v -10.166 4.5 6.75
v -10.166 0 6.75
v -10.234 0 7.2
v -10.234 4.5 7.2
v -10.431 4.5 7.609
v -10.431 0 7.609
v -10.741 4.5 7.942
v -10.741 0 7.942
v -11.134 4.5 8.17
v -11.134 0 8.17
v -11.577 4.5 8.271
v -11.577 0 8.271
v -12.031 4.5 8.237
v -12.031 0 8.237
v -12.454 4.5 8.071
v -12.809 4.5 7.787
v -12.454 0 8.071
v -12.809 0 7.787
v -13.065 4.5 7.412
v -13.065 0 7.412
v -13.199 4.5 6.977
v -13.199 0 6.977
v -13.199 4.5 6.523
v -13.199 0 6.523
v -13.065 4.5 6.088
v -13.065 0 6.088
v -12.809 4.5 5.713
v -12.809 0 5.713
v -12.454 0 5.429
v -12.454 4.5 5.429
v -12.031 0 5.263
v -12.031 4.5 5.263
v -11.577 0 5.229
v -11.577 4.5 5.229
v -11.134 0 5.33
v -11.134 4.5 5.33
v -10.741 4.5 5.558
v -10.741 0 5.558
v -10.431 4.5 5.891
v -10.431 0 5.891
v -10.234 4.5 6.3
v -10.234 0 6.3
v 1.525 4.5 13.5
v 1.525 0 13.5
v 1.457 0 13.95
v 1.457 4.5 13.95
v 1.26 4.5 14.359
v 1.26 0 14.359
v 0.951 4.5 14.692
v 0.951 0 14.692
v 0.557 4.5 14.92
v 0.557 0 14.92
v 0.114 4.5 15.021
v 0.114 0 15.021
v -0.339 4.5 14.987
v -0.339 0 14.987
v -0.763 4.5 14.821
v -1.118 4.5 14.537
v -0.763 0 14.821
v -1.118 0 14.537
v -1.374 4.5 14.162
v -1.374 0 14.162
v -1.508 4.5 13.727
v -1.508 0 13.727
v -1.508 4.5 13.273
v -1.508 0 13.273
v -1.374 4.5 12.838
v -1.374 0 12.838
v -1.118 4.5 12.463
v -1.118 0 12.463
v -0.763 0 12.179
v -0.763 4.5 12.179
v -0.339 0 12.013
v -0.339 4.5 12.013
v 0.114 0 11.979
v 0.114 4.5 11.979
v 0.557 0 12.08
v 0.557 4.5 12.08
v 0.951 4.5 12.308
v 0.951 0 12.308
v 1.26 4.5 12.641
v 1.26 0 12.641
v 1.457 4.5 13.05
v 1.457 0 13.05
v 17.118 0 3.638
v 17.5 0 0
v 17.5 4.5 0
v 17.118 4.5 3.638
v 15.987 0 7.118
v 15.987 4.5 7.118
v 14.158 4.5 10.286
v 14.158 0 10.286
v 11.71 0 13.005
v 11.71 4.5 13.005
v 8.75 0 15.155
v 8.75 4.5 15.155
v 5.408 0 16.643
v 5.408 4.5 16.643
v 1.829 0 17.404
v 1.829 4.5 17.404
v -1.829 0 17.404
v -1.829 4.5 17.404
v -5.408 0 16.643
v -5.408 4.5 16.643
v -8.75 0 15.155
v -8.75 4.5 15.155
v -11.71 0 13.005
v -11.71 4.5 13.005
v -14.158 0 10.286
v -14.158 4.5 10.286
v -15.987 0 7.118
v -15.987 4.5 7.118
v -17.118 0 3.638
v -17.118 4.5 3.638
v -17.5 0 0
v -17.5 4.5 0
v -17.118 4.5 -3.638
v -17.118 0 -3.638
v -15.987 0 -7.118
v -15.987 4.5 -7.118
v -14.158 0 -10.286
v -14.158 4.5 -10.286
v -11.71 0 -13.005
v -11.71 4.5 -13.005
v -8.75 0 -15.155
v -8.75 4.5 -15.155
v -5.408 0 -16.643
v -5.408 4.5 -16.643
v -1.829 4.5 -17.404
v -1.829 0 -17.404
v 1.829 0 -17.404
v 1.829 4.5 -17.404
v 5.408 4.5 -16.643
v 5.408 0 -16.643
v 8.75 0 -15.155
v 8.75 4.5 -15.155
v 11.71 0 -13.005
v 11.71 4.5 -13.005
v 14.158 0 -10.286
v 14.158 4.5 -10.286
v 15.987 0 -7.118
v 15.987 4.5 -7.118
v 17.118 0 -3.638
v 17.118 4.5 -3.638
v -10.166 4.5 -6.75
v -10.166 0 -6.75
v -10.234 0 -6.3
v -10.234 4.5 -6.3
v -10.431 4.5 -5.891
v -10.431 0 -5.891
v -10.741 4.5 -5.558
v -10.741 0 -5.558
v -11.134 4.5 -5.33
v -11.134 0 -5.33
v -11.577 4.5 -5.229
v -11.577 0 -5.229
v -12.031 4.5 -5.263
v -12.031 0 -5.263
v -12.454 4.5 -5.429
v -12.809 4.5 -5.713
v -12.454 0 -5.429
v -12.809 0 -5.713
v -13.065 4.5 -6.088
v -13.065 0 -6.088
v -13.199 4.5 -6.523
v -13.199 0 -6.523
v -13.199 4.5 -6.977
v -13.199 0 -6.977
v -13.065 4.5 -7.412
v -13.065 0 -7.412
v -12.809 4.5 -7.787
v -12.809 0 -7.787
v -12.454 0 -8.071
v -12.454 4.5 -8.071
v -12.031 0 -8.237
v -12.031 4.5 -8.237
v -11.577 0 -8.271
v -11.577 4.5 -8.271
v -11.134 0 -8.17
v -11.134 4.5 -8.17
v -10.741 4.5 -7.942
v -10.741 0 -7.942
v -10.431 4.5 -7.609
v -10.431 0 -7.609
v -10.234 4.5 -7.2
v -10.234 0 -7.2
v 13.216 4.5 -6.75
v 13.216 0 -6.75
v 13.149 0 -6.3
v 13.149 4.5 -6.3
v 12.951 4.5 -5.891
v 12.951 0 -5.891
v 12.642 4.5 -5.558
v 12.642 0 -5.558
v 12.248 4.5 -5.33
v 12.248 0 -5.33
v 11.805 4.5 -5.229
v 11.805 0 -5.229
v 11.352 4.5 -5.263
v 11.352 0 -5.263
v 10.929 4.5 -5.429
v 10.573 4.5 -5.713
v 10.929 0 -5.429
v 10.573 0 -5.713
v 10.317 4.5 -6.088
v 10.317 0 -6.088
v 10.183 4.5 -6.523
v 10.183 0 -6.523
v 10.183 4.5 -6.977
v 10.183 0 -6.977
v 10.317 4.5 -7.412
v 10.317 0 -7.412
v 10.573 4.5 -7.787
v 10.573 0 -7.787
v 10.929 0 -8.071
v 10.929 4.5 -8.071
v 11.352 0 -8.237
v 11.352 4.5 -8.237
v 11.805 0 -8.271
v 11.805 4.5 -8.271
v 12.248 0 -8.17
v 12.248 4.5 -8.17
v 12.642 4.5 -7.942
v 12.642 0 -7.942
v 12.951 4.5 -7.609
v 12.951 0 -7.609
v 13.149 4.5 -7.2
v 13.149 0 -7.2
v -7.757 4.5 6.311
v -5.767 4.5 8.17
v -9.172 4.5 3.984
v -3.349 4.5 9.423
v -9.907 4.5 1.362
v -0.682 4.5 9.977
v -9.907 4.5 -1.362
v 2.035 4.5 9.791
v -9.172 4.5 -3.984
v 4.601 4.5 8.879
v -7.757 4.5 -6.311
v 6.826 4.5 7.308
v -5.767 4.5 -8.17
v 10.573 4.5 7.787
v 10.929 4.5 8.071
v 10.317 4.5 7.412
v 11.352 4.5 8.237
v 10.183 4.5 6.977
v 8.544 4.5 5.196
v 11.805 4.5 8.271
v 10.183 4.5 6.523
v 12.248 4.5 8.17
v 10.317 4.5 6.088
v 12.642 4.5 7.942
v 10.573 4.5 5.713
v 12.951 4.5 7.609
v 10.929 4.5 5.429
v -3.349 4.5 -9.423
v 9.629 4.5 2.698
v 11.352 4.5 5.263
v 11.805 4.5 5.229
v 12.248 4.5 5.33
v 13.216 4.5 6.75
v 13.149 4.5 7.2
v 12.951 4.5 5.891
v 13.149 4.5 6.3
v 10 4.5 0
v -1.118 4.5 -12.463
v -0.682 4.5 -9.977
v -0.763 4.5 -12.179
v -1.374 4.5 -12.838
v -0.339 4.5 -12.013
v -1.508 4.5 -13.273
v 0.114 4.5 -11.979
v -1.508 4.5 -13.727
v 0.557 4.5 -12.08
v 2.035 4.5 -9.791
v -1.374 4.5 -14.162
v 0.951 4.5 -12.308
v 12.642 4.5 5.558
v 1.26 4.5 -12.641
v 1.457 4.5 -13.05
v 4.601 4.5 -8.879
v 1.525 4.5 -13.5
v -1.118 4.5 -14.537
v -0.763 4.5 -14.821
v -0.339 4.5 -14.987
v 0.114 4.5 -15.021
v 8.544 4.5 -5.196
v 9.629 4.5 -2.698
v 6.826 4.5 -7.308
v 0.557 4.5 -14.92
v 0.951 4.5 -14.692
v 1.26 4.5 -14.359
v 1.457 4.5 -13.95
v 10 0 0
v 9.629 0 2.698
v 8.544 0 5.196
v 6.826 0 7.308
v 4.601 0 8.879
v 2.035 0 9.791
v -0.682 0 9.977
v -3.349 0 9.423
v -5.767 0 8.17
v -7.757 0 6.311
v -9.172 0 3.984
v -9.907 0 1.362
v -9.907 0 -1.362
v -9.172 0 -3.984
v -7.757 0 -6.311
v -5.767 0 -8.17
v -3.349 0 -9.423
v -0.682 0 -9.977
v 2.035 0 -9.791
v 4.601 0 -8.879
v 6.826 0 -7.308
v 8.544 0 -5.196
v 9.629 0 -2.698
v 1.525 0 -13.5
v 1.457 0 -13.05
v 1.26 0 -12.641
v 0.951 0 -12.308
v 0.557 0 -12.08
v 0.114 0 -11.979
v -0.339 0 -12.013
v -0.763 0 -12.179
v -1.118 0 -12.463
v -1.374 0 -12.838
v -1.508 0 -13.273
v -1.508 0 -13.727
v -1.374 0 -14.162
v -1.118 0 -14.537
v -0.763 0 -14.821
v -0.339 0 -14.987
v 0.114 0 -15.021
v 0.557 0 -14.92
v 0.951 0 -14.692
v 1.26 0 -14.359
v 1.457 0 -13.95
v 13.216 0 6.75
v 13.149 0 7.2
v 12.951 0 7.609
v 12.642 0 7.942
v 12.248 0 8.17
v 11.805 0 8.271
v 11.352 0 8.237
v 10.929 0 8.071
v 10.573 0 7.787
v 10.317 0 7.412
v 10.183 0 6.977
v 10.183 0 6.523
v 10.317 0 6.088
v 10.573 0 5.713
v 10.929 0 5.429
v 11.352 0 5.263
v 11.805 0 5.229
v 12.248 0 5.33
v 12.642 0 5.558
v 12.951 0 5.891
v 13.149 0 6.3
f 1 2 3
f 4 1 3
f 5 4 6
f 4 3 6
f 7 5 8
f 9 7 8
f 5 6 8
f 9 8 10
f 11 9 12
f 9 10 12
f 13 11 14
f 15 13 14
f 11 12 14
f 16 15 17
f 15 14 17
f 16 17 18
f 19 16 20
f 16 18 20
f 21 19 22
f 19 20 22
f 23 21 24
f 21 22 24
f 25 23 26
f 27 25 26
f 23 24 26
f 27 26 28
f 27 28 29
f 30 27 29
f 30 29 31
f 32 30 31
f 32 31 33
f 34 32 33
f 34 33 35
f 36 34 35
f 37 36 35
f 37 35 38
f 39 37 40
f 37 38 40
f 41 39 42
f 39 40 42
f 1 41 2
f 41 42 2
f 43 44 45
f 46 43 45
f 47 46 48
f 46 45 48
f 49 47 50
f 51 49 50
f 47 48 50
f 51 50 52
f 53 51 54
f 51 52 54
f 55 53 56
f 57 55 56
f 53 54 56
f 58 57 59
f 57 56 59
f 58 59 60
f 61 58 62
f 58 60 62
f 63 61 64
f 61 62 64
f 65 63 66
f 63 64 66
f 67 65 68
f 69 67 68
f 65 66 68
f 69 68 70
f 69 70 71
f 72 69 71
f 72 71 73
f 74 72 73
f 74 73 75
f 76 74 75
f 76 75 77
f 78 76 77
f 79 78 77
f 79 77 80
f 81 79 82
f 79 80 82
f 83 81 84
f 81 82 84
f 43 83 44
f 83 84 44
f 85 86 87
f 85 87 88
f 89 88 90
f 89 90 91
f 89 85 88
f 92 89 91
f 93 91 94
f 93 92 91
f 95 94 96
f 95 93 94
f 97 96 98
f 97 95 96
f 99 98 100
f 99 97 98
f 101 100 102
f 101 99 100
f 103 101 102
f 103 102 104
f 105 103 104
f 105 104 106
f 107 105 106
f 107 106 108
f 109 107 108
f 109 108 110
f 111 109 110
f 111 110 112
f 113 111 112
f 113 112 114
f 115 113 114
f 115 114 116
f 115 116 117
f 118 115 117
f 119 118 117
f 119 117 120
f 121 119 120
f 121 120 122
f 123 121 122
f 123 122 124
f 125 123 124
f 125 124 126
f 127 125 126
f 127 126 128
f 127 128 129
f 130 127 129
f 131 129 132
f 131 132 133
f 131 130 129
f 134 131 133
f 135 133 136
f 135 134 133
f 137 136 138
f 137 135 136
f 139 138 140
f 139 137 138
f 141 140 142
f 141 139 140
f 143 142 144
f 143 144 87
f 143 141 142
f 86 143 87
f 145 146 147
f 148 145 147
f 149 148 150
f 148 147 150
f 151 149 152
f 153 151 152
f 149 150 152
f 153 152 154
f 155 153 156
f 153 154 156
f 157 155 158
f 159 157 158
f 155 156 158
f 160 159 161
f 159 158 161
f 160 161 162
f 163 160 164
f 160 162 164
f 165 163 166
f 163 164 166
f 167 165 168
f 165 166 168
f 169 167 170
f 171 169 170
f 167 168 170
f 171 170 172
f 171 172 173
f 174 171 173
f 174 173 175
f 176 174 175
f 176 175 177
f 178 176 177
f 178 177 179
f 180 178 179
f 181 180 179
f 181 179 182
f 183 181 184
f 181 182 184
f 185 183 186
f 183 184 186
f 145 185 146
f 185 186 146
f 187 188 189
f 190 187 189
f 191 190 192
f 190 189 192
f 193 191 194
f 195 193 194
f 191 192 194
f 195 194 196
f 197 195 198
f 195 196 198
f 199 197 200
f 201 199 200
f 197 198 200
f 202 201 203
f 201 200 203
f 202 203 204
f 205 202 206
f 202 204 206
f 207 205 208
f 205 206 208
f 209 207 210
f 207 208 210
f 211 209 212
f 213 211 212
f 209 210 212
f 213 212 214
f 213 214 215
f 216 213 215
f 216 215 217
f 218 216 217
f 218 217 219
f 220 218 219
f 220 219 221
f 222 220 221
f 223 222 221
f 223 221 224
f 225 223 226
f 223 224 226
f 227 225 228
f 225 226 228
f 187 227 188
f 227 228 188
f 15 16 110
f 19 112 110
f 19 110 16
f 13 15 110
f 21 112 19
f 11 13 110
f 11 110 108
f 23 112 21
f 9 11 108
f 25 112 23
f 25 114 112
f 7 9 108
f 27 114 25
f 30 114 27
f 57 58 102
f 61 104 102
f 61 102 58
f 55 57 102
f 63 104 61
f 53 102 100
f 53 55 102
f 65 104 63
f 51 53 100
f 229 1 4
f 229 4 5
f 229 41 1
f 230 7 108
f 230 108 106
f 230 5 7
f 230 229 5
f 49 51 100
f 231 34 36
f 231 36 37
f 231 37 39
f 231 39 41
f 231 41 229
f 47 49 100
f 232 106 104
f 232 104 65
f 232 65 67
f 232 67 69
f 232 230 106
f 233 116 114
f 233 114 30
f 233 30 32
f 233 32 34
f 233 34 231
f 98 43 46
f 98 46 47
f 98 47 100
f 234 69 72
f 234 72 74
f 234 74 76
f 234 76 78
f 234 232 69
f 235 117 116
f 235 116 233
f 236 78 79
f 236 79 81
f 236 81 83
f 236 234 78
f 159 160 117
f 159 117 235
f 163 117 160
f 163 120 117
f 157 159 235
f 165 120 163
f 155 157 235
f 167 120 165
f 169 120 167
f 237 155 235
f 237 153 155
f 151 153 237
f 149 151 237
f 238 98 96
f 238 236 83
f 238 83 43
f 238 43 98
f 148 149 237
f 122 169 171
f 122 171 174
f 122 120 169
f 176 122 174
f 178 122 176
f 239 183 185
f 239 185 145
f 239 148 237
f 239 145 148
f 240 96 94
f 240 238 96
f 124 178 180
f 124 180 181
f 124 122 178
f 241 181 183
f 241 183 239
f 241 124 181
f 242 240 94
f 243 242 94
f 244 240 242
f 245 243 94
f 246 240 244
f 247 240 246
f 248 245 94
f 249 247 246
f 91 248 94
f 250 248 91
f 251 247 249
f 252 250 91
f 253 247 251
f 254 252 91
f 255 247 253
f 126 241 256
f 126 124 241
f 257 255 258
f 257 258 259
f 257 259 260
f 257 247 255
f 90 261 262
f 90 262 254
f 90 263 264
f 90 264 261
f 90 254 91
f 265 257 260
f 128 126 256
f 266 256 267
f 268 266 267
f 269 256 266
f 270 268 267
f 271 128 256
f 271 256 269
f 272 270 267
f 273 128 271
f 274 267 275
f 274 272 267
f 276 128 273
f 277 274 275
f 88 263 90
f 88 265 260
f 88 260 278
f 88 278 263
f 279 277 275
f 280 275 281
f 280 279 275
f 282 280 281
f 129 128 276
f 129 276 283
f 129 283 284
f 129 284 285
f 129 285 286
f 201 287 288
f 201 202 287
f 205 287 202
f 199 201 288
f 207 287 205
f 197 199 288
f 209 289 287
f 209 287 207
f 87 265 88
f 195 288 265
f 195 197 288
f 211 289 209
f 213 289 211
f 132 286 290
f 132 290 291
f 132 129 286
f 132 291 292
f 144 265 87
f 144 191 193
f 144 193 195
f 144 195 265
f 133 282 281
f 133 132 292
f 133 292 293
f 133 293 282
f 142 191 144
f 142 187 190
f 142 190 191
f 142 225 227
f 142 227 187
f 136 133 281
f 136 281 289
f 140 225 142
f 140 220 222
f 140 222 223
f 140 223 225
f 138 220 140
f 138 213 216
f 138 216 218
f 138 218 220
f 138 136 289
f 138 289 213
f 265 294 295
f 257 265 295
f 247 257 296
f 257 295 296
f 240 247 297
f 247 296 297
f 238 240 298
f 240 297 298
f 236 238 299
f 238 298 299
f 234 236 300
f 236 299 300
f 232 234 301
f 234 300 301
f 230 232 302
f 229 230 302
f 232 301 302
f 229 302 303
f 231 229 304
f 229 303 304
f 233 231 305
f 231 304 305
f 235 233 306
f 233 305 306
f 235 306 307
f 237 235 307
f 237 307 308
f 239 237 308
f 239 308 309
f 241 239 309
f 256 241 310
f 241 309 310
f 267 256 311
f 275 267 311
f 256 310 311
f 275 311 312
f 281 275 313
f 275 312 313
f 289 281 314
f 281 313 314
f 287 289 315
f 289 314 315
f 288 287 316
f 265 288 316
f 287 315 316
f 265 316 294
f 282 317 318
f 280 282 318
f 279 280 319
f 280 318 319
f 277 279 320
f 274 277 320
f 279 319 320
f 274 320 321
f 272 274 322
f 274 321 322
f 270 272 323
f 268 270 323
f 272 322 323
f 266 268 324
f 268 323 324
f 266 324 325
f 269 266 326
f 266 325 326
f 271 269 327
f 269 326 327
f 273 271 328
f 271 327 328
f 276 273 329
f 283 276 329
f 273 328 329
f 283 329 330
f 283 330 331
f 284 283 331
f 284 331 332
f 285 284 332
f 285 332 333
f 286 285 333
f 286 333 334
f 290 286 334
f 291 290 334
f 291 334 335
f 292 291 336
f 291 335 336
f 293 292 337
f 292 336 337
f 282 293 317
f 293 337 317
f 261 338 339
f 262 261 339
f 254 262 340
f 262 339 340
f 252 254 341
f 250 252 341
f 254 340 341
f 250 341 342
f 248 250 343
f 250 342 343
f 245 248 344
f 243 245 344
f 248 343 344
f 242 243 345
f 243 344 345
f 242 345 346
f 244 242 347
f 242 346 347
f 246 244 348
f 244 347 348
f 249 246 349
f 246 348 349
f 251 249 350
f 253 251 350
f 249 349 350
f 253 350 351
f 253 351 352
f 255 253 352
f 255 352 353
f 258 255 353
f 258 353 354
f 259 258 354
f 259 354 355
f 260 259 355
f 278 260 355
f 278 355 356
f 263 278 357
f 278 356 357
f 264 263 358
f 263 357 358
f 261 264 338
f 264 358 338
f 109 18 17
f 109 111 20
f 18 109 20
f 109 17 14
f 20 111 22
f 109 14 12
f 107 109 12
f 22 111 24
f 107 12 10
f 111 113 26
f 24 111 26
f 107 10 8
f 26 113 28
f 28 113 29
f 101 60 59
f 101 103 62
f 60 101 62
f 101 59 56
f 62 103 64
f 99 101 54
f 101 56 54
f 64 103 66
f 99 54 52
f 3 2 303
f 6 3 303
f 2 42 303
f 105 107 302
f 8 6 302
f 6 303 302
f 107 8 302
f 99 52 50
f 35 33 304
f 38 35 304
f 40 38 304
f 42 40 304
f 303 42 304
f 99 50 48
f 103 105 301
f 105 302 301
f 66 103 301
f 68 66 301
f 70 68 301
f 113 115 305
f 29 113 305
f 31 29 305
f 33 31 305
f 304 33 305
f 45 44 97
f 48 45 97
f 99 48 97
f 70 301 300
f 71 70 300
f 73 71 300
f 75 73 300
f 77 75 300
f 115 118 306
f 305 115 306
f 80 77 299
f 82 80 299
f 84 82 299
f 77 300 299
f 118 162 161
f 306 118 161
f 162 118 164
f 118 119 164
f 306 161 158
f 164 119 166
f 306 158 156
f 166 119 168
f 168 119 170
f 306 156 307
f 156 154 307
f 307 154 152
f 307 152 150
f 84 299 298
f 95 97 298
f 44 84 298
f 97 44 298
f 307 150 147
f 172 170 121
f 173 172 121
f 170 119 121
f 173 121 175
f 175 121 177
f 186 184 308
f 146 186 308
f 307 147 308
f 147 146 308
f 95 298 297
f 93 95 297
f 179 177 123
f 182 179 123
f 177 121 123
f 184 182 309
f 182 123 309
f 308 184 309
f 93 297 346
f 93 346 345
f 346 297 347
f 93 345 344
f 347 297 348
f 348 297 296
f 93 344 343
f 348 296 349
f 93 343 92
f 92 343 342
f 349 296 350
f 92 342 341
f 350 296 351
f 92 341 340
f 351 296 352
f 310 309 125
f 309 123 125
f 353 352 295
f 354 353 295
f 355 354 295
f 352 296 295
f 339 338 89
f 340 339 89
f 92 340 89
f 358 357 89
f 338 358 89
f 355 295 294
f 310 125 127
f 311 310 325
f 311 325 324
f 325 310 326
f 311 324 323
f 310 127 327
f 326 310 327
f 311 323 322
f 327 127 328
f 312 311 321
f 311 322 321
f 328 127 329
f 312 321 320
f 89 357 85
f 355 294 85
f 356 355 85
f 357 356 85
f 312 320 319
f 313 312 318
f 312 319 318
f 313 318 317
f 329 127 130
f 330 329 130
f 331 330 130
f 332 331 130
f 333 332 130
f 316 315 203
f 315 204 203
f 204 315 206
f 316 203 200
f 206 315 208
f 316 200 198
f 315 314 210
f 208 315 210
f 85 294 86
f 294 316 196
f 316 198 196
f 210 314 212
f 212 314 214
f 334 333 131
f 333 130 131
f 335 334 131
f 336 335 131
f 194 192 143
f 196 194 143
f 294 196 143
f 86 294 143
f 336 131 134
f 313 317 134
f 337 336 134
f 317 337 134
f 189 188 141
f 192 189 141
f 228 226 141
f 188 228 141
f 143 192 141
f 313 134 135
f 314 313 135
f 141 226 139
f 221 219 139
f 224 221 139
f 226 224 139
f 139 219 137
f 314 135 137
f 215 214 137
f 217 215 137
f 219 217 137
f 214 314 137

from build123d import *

# Parameters (mm, degrees)
SKETCH_1_R               = 31.5
SKETCH_1_R_2             = 22.5
EXTRUDE_1_DEPTH          = 4.5
SKETCH_2_R               = 2.025
CUT_EXTRUDE_1_DEPTH      = 1
CUT_EXTRUDE_1_DEPTH_BACK = 5.5
SKETCH_3_R               = 22.5
EXTRUDE_2_DEPTH          = 4.5
SKETCH_4_R               = 1.525
CUT_EXTRUDE_2_DEPTH      = 4.5
SKETCH_5_R               = 10
CUT_EXTRUDE_3_DEPTH      = 4.5
SKETCH_6_R               = 31.5
SKETCH_6_R_2             = 17.5
CUT_EXTRUDE_4_DEPTH      = 5.5


with BuildPart() as part:
    # 草图1 → 凸台-拉伸1 (new body)
    with BuildSketch(Plane(origin=(0, 0, 0), x_dir=(1, 0, 0), z_dir=(0, 1, 0))):
        Circle(SKETCH_1_R)
        Circle(SKETCH_1_R_2, mode=Mode.SUBTRACT)
    extrude(amount=EXTRUDE_1_DEPTH)

    # 草图2 → 切除-拉伸1 (cut, two sides)
    with BuildSketch(Plane(origin=(0, 4.5, 0), x_dir=(1, 0, 0), z_dir=(0, 1, 0))) as cut_extrude_1_sk:
        with Locations((0, 26.25)):
            Circle(SKETCH_2_R)
        with Locations((18.561553006, 18.561553006)):
            Circle(SKETCH_2_R)
        with Locations((26.25, 0)):
            Circle(SKETCH_2_R)
        with Locations((18.561553006, -18.561553006)):
            Circle(SKETCH_2_R)
        with Locations((0, -26.25)):
            Circle(SKETCH_2_R)
        with Locations((-18.561553006, -18.561553006)):
            Circle(SKETCH_2_R)
        with Locations((-26.25, 0)):
            Circle(SKETCH_2_R)
        with Locations((-18.561553006, 18.561553006)):
            Circle(SKETCH_2_R)
    extrude(amount=CUT_EXTRUDE_1_DEPTH, mode=Mode.SUBTRACT)
    extrude(cut_extrude_1_sk.sketch, amount=-CUT_EXTRUDE_1_DEPTH_BACK, mode=Mode.SUBTRACT)

    # 草图3 → 凸台-拉伸2 (add)
    with BuildSketch(Plane(origin=(0, 4.5, 0), x_dir=(1, 0, 0), z_dir=(0, 1, 0))):
        Circle(SKETCH_3_R)
    extrude(amount=-EXTRUDE_2_DEPTH)

    # 草图4 → 切除-拉伸2 (cut)
    with BuildSketch(Plane.XZ):
        with Locations((0, 13.5)):
            Circle(SKETCH_4_R)
        with Locations((11.691342951, 6.75)):
            Circle(SKETCH_4_R)
        with Locations((11.691342951, -6.75)):
            Circle(SKETCH_4_R)
        with Locations((0, -13.5)):
            Circle(SKETCH_4_R)
        with Locations((-11.691342951, -6.75)):
            Circle(SKETCH_4_R)
        with Locations((-11.691342951, 6.75)):
            Circle(SKETCH_4_R)
    extrude(amount=-CUT_EXTRUDE_2_DEPTH, mode=Mode.SUBTRACT)

    # 草图5 → 切除-拉伸3 (cut)
    with BuildSketch(Plane.XZ):
        Circle(SKETCH_5_R)
    extrude(amount=-CUT_EXTRUDE_3_DEPTH, mode=Mode.SUBTRACT)

    # 草图6 → 切除-拉伸4 (cut, through all)
    with BuildSketch(Plane.XZ):
        Circle(SKETCH_6_R)
        Circle(SKETCH_6_R_2, mode=Mode.SUBTRACT)
    extrude(amount=-CUT_EXTRUDE_4_DEPTH, mode=Mode.SUBTRACT)


solid = part.part
